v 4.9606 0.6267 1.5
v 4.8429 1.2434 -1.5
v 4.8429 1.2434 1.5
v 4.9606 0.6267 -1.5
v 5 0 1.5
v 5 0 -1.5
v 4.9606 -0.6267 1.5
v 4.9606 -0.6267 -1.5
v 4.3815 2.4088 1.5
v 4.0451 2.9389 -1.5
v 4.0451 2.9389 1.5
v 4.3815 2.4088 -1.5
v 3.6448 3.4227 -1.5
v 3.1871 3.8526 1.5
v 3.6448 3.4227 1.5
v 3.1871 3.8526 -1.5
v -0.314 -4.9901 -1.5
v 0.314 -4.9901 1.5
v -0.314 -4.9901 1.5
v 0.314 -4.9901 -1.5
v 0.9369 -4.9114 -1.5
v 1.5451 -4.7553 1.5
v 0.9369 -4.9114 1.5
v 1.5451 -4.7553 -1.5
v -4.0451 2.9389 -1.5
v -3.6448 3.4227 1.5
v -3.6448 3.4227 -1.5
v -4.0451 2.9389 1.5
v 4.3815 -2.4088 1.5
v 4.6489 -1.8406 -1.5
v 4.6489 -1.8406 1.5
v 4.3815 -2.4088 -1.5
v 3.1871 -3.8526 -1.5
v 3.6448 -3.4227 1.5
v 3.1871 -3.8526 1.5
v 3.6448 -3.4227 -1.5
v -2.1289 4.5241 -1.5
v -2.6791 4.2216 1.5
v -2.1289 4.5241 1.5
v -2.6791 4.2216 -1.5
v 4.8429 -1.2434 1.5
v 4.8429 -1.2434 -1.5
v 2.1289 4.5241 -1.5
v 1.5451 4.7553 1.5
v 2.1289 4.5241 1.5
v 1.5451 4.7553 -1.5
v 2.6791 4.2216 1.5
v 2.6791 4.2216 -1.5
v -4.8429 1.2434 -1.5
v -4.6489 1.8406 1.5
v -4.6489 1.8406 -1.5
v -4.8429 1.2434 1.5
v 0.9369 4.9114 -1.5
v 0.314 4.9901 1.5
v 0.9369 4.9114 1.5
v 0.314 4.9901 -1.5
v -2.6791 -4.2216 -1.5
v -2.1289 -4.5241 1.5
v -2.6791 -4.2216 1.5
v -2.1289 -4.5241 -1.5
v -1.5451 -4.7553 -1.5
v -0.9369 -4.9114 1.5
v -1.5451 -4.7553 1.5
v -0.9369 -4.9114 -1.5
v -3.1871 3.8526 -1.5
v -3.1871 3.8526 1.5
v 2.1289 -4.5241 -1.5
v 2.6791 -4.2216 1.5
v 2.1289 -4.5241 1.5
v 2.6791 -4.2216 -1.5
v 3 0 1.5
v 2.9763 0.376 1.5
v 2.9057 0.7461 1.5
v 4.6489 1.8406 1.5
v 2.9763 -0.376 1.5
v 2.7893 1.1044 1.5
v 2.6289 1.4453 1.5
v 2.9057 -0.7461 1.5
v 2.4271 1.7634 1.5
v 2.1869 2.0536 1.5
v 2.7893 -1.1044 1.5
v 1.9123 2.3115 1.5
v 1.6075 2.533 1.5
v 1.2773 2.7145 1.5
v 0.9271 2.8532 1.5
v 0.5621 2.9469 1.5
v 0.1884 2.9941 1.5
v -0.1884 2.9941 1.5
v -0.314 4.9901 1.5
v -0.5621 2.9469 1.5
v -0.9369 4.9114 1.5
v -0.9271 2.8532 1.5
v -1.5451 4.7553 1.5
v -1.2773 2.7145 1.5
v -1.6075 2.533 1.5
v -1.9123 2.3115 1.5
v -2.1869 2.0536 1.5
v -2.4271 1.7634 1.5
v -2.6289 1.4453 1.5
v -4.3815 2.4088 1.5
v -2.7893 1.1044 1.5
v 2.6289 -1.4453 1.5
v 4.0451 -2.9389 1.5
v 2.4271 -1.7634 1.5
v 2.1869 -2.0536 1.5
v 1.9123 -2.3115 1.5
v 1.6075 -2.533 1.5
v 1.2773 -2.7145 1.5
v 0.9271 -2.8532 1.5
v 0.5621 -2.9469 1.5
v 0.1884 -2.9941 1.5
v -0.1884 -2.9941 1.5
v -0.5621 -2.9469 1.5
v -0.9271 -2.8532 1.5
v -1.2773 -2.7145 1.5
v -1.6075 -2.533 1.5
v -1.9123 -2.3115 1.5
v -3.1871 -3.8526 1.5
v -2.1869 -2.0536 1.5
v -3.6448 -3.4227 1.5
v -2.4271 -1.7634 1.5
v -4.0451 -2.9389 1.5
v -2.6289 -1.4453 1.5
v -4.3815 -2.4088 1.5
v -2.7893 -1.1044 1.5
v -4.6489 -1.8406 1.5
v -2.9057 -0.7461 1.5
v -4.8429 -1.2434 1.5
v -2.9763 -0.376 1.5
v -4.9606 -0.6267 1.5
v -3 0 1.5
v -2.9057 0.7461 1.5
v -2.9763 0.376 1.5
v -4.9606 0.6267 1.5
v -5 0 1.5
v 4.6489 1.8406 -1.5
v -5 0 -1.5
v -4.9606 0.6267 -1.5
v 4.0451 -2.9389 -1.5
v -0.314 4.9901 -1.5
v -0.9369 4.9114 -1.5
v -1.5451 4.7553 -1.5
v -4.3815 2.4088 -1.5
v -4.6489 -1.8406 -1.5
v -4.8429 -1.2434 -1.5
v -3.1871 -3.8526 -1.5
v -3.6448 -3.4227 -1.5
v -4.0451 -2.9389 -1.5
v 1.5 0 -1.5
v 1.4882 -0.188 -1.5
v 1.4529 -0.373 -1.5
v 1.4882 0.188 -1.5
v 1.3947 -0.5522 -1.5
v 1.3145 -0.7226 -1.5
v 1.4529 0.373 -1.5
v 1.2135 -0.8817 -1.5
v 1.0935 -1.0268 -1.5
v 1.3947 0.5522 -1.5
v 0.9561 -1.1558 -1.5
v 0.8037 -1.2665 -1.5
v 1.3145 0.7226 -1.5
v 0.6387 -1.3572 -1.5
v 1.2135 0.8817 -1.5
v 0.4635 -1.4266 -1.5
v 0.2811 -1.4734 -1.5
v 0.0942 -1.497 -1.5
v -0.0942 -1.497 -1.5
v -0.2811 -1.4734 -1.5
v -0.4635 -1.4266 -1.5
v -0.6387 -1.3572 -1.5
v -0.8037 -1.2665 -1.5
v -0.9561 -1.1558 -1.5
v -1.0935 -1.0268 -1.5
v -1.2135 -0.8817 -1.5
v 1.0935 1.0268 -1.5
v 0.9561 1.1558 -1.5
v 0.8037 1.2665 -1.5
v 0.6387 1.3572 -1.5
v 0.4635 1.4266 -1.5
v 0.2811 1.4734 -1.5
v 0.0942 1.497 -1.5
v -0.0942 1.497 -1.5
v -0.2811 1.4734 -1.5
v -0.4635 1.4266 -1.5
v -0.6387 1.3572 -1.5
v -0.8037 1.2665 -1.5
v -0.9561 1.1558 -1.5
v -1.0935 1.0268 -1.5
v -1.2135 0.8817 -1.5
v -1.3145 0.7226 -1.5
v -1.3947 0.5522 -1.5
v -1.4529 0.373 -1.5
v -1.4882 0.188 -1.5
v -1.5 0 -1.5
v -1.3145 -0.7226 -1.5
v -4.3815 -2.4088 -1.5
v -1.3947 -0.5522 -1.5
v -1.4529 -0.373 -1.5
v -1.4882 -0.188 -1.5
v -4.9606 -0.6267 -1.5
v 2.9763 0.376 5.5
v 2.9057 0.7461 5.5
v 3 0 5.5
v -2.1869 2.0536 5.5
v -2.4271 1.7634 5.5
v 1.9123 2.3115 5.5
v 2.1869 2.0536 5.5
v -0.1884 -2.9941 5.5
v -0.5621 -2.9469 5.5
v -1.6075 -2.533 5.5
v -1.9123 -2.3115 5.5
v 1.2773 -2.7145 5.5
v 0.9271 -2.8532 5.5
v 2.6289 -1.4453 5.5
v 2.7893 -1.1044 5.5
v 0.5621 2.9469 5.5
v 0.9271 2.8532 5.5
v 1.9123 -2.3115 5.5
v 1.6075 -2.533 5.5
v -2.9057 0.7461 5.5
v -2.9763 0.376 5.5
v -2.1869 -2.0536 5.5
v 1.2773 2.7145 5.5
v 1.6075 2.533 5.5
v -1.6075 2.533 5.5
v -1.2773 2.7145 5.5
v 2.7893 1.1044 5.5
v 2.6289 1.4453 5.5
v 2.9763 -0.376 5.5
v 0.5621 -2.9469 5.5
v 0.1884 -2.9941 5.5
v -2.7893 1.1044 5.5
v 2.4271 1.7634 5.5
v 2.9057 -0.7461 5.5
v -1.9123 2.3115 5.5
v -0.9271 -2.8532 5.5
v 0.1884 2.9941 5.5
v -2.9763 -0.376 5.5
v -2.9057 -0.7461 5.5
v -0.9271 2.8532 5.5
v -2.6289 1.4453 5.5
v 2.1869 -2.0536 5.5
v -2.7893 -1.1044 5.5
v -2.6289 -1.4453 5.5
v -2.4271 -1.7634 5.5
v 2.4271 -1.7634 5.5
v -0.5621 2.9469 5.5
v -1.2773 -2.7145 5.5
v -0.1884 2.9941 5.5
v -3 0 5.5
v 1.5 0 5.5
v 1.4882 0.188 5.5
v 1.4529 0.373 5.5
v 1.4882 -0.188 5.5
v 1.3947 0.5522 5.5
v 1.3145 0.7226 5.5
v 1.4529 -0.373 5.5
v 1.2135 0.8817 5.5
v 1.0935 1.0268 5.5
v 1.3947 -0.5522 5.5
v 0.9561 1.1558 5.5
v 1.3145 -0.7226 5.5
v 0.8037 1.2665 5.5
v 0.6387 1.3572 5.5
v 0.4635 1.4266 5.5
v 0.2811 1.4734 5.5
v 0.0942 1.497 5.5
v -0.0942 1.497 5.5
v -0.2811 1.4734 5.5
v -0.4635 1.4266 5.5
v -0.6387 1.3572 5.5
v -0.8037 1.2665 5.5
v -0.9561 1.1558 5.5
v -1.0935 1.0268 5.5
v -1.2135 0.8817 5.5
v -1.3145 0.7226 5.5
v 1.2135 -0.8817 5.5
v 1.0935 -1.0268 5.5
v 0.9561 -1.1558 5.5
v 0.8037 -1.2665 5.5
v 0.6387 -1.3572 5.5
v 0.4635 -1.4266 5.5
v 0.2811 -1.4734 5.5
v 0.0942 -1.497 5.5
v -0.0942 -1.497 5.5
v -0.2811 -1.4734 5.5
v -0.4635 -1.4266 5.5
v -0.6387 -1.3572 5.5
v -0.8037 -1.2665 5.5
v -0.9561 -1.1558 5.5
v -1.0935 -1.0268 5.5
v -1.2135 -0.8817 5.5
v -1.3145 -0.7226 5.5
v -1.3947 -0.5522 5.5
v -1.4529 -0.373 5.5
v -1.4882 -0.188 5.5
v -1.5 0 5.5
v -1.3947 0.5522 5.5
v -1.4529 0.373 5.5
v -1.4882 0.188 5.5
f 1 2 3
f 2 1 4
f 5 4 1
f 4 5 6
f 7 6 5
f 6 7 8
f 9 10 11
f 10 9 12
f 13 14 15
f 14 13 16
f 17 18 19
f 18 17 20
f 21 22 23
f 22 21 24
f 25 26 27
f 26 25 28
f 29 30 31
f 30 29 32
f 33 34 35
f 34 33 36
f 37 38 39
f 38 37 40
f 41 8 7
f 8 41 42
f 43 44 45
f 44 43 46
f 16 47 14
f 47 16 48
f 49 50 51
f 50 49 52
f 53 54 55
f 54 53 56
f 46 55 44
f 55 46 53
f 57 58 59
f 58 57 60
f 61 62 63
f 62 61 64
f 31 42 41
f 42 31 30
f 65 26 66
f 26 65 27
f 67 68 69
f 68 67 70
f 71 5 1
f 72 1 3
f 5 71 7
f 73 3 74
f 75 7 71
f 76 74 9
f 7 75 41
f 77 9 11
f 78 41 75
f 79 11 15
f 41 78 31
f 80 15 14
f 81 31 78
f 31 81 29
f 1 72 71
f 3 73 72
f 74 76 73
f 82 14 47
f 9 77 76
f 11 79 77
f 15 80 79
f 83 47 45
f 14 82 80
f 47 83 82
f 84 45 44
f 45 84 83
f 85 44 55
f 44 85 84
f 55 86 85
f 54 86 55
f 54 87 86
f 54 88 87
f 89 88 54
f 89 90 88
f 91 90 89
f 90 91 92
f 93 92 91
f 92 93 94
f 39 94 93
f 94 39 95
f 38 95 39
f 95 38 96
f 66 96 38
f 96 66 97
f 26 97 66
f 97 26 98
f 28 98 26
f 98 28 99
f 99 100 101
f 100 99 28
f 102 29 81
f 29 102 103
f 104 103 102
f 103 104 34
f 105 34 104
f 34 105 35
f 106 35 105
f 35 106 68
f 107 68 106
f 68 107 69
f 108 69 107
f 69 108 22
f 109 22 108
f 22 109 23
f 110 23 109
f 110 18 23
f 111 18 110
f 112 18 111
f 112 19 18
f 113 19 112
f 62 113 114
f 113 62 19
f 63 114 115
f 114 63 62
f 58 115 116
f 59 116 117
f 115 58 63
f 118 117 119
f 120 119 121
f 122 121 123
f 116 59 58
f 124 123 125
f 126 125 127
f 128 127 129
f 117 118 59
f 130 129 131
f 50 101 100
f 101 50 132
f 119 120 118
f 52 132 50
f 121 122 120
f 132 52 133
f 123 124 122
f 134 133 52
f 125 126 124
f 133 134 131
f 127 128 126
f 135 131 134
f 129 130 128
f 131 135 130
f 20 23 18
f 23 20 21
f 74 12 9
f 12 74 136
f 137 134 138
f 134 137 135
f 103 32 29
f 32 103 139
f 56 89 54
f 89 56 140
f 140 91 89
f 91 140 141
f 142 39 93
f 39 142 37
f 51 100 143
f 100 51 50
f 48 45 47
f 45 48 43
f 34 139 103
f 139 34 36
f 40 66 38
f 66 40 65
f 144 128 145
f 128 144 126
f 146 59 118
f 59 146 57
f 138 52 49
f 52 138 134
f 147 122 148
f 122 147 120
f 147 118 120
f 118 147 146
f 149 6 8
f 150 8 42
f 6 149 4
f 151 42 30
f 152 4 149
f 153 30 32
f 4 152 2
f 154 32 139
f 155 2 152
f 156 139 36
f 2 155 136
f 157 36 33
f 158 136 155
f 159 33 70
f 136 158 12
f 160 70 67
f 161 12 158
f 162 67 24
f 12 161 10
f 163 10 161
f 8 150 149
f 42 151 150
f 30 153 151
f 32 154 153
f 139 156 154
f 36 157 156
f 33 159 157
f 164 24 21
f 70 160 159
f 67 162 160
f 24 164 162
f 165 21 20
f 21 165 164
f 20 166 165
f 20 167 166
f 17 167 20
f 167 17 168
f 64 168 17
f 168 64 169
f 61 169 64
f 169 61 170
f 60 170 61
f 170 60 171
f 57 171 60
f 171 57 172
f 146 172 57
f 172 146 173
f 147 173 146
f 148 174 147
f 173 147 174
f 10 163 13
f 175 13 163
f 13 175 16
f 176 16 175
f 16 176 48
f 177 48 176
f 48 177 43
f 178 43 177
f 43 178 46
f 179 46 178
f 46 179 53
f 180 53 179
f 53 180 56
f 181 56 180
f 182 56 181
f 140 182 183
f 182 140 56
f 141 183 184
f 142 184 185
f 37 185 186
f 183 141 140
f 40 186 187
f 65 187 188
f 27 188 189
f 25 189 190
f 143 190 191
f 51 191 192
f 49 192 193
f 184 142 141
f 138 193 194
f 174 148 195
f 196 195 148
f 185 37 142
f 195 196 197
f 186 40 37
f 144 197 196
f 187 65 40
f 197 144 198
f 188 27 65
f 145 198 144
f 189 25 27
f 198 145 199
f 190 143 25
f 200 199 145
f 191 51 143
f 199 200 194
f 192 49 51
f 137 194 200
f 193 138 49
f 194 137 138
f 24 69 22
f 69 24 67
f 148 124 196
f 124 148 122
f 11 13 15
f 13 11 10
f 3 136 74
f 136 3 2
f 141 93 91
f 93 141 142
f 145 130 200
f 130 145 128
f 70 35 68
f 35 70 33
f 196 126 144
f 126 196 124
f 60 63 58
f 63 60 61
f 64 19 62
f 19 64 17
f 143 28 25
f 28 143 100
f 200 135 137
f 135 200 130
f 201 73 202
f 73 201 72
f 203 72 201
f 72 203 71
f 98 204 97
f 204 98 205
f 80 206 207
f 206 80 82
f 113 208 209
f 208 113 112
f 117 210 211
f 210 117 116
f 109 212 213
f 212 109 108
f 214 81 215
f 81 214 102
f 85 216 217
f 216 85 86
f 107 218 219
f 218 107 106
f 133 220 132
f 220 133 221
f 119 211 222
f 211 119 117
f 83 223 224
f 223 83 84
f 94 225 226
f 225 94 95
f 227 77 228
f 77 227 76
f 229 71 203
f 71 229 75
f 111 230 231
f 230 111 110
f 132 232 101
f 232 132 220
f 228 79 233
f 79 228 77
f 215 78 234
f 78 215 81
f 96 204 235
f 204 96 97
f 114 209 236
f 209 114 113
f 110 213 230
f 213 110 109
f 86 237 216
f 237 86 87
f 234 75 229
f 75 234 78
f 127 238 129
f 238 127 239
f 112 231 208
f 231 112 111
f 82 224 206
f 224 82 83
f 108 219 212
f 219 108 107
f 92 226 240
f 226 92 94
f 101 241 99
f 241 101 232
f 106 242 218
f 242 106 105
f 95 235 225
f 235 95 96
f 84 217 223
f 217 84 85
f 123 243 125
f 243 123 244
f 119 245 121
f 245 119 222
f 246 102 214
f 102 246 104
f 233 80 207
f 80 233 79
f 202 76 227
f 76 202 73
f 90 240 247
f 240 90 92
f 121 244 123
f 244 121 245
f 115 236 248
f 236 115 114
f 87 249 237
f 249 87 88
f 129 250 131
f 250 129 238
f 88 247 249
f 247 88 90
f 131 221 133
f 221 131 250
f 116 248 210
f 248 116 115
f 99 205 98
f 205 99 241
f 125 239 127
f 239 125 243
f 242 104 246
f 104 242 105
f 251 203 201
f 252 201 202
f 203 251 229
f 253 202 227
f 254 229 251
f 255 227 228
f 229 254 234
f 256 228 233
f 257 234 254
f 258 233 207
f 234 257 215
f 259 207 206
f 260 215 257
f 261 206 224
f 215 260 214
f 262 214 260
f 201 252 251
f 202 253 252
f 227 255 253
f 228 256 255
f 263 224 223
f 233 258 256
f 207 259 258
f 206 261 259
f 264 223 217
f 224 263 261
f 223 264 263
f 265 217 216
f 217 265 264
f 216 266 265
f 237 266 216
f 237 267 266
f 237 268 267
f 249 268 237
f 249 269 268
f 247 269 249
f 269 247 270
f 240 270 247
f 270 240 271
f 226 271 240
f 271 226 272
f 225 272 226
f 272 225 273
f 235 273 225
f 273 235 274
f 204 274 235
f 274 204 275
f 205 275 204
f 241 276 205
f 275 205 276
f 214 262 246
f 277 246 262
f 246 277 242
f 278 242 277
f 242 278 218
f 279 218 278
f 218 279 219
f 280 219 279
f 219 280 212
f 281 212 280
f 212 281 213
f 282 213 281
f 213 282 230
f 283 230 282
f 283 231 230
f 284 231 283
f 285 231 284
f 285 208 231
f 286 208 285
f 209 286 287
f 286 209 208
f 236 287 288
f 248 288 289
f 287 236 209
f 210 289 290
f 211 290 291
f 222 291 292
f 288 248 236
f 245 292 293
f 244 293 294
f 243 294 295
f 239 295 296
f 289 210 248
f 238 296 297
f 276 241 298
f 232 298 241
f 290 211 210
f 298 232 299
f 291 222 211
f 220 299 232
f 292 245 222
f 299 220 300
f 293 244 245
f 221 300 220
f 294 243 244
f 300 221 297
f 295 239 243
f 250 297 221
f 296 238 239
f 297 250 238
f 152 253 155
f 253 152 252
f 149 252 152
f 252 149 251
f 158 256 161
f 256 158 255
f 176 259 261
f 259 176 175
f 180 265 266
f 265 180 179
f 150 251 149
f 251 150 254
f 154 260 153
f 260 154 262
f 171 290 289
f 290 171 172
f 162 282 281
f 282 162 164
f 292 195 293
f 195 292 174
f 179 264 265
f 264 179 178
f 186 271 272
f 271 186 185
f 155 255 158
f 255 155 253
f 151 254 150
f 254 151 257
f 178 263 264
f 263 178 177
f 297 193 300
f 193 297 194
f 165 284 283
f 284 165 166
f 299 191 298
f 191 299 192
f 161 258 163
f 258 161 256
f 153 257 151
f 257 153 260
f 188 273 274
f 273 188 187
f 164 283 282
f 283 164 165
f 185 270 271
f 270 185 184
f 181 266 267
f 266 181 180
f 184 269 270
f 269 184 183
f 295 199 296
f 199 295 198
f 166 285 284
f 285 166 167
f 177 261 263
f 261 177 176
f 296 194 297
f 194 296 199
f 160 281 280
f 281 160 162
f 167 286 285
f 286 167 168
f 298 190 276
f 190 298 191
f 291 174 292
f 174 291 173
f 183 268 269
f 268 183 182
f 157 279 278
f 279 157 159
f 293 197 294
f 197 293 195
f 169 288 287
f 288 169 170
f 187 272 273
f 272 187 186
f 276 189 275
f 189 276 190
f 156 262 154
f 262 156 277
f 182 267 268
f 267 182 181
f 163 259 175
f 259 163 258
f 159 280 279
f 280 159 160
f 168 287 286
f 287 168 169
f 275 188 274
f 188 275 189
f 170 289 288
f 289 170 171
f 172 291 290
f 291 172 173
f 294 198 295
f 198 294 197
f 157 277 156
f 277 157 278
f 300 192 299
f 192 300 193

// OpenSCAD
$fn = 50;


difference() {
	union() {
		translate(v = [0, 0, -1.5000000000]) {
			cylinder(h = 3, r = 5.0000000000);
		}
		translate(v = [0, 0, -1.5000000000]) {
			cylinder(h = 7, r = 3.0000000000);
		}
	}
	union() {
		translate(v = [0, 0, -50.0000000000]) {
			cylinder(h = 100, r = 1.5000000000);
		}
	}
}
